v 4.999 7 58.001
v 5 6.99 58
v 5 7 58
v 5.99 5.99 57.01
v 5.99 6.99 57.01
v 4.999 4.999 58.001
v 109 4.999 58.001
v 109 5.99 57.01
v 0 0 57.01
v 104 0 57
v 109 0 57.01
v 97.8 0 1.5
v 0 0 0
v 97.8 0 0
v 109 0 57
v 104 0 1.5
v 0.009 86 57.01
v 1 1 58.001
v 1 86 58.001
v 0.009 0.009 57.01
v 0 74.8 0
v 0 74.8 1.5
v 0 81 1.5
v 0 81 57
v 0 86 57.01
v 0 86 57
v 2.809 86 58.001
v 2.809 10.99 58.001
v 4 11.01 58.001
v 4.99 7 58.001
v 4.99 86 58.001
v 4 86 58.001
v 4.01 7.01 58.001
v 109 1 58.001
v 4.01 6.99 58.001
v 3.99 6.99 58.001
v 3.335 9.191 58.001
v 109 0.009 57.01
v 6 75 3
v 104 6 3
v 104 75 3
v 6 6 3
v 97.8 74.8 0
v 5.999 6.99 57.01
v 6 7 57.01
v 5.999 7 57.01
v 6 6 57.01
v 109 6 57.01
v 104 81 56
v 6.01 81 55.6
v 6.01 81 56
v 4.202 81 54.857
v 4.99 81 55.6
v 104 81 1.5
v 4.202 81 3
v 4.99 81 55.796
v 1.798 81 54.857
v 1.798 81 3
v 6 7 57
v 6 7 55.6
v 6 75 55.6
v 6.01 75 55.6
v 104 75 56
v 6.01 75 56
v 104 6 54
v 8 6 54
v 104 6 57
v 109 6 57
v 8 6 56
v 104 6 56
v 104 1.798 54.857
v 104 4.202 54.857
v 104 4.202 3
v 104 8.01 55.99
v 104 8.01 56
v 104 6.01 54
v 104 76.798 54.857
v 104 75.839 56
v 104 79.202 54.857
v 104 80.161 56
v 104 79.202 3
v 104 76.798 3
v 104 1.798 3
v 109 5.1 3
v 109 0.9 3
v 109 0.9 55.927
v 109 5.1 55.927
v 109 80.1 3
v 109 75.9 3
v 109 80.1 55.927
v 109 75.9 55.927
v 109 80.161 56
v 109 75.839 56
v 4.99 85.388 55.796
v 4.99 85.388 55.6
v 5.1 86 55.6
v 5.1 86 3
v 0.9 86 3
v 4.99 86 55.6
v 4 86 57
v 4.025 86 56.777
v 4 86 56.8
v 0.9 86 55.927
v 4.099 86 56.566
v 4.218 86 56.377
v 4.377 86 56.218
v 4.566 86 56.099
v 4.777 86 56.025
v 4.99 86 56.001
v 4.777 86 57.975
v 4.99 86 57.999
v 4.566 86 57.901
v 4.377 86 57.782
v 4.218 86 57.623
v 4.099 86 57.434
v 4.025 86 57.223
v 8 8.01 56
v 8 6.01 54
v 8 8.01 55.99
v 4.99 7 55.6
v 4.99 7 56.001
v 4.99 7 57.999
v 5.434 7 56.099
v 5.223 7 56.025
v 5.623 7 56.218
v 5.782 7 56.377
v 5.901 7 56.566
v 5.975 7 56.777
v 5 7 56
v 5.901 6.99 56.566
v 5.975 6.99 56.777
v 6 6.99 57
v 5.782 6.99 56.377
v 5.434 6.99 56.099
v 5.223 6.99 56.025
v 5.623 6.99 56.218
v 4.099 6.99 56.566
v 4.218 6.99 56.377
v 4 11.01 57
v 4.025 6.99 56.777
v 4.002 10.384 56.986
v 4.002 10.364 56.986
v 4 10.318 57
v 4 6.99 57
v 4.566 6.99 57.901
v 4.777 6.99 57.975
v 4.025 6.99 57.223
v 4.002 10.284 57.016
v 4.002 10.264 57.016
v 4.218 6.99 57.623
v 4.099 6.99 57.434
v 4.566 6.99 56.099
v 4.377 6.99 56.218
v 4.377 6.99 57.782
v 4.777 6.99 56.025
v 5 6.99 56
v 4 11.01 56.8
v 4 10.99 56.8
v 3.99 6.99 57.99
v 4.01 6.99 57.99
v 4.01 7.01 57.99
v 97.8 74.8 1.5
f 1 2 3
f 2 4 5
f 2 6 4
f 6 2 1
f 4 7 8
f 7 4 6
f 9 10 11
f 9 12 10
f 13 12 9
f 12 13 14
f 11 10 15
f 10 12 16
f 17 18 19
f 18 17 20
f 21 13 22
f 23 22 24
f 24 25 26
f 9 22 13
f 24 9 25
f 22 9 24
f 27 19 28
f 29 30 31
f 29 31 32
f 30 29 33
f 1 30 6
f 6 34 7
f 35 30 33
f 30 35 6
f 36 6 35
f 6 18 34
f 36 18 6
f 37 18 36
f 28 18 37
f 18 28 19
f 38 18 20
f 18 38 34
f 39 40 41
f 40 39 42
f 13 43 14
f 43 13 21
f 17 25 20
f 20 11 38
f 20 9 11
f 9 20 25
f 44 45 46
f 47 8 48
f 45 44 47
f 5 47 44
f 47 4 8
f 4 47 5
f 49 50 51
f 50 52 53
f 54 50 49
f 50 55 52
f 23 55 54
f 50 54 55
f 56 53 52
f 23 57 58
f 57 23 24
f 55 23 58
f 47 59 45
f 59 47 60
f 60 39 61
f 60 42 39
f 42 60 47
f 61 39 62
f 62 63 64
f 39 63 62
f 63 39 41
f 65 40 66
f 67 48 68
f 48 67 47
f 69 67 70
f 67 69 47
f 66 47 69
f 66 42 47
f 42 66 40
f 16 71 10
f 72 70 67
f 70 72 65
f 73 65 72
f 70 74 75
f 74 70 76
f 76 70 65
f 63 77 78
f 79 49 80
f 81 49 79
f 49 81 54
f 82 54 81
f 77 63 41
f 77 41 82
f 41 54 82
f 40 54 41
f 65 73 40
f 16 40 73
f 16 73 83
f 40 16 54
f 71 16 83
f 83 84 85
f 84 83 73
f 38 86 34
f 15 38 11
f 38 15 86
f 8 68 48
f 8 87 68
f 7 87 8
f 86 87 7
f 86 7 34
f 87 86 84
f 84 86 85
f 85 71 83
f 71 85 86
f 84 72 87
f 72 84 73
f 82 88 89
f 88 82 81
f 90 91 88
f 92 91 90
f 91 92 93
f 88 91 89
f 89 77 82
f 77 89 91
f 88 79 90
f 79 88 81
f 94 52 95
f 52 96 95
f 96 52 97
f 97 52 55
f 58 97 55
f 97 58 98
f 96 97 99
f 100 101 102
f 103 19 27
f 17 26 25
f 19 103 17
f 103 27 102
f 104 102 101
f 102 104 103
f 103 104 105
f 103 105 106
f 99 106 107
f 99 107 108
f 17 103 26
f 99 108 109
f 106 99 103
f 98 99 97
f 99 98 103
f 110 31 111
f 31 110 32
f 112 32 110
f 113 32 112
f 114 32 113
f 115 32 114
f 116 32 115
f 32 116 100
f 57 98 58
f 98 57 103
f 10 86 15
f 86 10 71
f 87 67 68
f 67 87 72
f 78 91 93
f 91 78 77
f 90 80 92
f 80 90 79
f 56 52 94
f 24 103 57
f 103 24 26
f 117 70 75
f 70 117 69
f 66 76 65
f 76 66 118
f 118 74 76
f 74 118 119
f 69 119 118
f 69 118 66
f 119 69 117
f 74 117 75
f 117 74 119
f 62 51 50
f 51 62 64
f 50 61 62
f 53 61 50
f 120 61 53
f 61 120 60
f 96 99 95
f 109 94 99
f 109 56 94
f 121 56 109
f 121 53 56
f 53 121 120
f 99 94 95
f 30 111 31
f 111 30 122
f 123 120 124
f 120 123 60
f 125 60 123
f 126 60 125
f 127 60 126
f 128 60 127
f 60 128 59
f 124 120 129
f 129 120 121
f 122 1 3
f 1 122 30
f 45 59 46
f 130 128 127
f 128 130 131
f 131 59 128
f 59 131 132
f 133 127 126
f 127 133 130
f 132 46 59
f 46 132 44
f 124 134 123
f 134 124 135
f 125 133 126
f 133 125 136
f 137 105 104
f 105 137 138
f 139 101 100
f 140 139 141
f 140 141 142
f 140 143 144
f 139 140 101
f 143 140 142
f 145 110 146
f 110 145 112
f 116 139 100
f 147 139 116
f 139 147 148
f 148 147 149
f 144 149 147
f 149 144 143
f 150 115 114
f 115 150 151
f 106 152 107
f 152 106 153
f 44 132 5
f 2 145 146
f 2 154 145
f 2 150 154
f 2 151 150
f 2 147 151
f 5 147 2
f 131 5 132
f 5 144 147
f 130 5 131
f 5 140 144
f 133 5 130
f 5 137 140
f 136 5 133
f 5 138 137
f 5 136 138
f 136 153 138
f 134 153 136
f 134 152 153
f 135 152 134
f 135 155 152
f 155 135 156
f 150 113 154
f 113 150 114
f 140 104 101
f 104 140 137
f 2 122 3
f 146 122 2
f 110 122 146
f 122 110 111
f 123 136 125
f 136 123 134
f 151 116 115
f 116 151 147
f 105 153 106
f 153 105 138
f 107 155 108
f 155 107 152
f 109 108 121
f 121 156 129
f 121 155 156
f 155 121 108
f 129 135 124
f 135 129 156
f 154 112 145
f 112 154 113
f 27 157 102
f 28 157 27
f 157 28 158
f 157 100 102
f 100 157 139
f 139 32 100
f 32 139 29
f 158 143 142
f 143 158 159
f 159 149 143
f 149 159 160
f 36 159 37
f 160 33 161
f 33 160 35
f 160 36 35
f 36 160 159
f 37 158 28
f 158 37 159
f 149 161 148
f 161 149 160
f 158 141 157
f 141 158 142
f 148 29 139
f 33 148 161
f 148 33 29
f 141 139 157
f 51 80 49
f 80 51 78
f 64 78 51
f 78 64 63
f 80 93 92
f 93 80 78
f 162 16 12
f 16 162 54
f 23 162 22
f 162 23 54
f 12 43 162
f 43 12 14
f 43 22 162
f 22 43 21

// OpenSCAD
// ============================================================================
// cutlery_box.scad
// Graduated 3-chamber disposable-cutlery box (Option 3) — CUT-FROM-SOLID port
// of build_box.py, for a 120 x 120 x 120 mm printer (AOSEED).
//
// WHY THIS PORT EXISTS (the whole point):
//   The hand-mesh generator (build_box.py) could not keep the 1 mm rim chamfer
//   continuous across the female dovetail joints, because where a slot's flared
//   corner crosses the sloped chamfer it needs a true boolean intersection.
//   OpenSCAD HAS that boolean kernel, so here we do exactly the "cut-from-solid"
//   thing:
//      1. Build the ENTIRE box as ONE solid, WITH the chamfer already on it.
//      2. difference() out vertical dovetail prisms ( /_\ cross-section ),
//         running from just above the base plate up THROUGH the rim, to both
//         (a) form the sliding-dovetail joints, and
//         (b) split the box into 6 bed-sized pieces.
//   Because the cut is a real boolean through the already-chamfered solid, the
//   sloped chamfer<->slot edge is produced for free => the rim chamfer stays
//   CONTINUOUS across every joint, with none of the sliver hacks.
//
// ----------------------------------------------------------------------------
// HOW TO USE
//   In the app:  set `part` below (or use the Customizer dropdown), F5 to
//                preview, F6 to render, then File > Export > STL.
//   One piece (CLI):
//      openscad -o body_knife_A.stl -D 'part="knife_A"' cutlery_box.scad
//   ALL SIX (bash, run from this folder):
//      for p in knife_A knife_B fork_A fork_B spoon_A spoon_B; do \
//        openscad -o "body_$p.stl" -D "part=\"$p\"" cutlery_box.scad ; done
//   PNG preview of one piece:
//      openscad -o knife_B.png --imgsize=1400,1000 --autocenter --viewall \
//        -D 'part="knife_B"' cutlery_box.scad
//
//   Pieces are modelled in ASSEMBLED coordinates (floor-down, z=0 is the bed),
//   so importing all six STLs together shows the assembled box directly; your
//   slicer will auto-drop each one onto the plate for printing.
//
// BED SANITY: every piece is <= 120 mm in X, Y, Z.
//   Z = 58 mm. Widest piece = spoon at 117 mm (Y). A-halves reach 109 mm (X,
//   including the protruding dovetail key). All under 120.
//
// !! I could NOT run OpenSCAD to verify this file (no binary in my sandbox) !!
//   - The rim chamfer is a SMOOTH, true-45 bevel built from hull() frustums of
//     convex rectangles. Works in every OpenSCAD since ~2015 (incl. Homebrew
//     2021.01). No stepped staircase -- and, crucially, it makes box() a clean
//     well-formed solid so the per-part booleans resolve reliably (the old
//     14-slice staircase was fragile and CGAL was dropping the walls of the
//     interior parts, leaving only the key prisms => "floating boxes").
//   - roof() is still available behind USE_ROOF=true for those who have it
//     (2021.01+ snapshots); for THIS rectangular design it is identical, so it
//     is NOT required.
//   - After F6, check the console for "WARNING"/"not a valid 2-manifold".
//     If a tenon ever looks detached, bump EPS to 0.05.
// ============================================================================


/* [Part to render / export] */
part = "knife_A"; // [knife_A, knife_B, fork_A, fork_B, spoon_A, spoon_B, assembly]

/* [Chamfer method] */
// false = smooth hull() frustum bevel (default, any OpenSCAD); true = roof() (2021.01+)
USE_ROOF = false;

/* [Heights (mm)] */
BASE   = 3.0;     // floor / base-plate thickness
COMP_H = 55.0;    // interior wall height above the floor (cutlery stack depth)

/* [Walls (mm)] */
HOST_T   = 6.0;     // thickness of every wall (thick enough to host a dovetail)
HALF_LEN = 104.0;   // printed length of each half (A = near, B = far); <120 incl. key

/* [Chamber bays (mm)] */
N_COL     = 3;       // columns of cutlery per chamber
KNIFE_COL = 23.0;    // -> knife bay 69  (3 x 19 mm knives + play)
FORK_COL  = 33.0;    // -> fork  bay 99  (3 x 29 mm forks  + play)
SPOON_COL = 37.0;    // -> spoon bay 111 (3 x 34 mm spoons + play, trimmed <120)

/* [Dovetail joint (mm)] */
DT_DEPTH = 5.0;   // tail protrusion past the seam (male key depth)
DT_NECK  = 1.2;   // half-width at the seam face (narrow)
DT_FLARE = 2.1;   // half-width at the tip (wide -> locks)
DT_CLR   = 0.4;   // FLANK/seam slide clearance added to the female socket (do not change for fit)
DT_DEPTH_RELIEF = 0.3; // extra depth on the socket BACK only, so the tail tip never bottoms out

/* [Hidden-dovetail top cap / "hat" (mm)] */
// The dovetail otherwise shows its trapezoid outline on the TOP edge of the wall.
// To hide it, the MALE piece extends the wall's full-width top (chamfer included)
// across the key footprint -> a flush, continuous top. The FEMALE piece gets a
// matching top RECESS (cap footprint + CAP_CLR) so the cap drops straight in.
// Result: the top reads as one surface with a single straight seam line at the cap
// tip; the dovetail joinery lives entirely below the cap.
//
// SELF-SUPPORTING UNDERSIDE: the cap reaches the FULL wall width at the chamfer base
// (so the top edge reads as the wall extended, with NO recessed sliver on the outer
// face), and its underside is ONE planar ramp from the chamfer's OUTER CORNER
// (half-width HOST_T/2 at z = BODY_H-CHAMFER) down to the dovetail-neck half-width
// (CAP_FOOT) at CAP_SLANT_DEG from horizontal. No little horizontal step. The ramp
// reaching full width exactly at the chamfer base means "ramp top" == "chamfer base"
// (CAP_H is DERIVED). The FEMALE recess is the same ramp + CAP_CLR play.
// TRADEOFF: because the cap runs all the way to the outer corner, the female wall
// tapers to ~0 at z = BODY_H-CHAMFER -> a thin feather edge at the joint (gradual at
// CAP_SLANT_DEG, hidden inside the joint when assembled). Accepted per design intent.
CAP_SLANT_DEG = 50;     // cap underside ramp angle from horizontal (50 = self-supporting, long flare)
CAP_FOOT = DT_NECK;     // cap-underside half-width where it meets the dovetail neck
CAP_CLR = 0.3;          // slide clearance so the male cap seats into the female top recess

/* [Rim chamfer (mm)] */
CHAMFER = 1.0;    // 45-deg comfort break broken along the top wall edges

/* [Base half-lap / anti-warp (mm)] */
// Neighbouring base plates overlap as a HORIZONTAL half-lap (shiplap) at mid-base
// height, so corners stay coplanar (no lift/protrusion). Horizontal lap faces do
// NOT bind the vertical-drop assembly. Shingle direction: A->B and knife->fork->spoon.
LAP_LEN = 6;        // overlap past the A/B seam and the knife/fork seam
LAP_LEN_FS = 2;     // overlap past the fork/SPOON seam -- SMALLER: spoon is the
                    // tightest piece (117mm of the 120mm bed); a 6mm lap there
                    // would push spoon to 123mm. 2mm keeps spoon at 119mm.
LAP_Z   = BASE/2;   // 1.5 -- horizontal split height of the lap (bottom vs top half)
LAP_CLR = 0.2;      // in-plane clearance so the shelf isn't a press fit

/* [Lid — box features that receive a flat ORDERED clear sheet] */
// The lid itself is NOT printed: it's a flat ~2 mm PETG/Tritan sheet, bullnose-polished
// edges (r=LID_EDGE_R), ordered to size. We only model the box features that receive it.
LID_T            = 2.0;   // ordered sheet thickness
LID_EDGE_R       = 1.0;   // ordered sheet bullnose edge radius (for the sheet order spec)
LID_PLAY         = 0.4;   // total vertical play in the hinge groove (sheet + this)
HINGE_AT_MINUS_X = true;  // hinge on the -x (303mm) end wall; clip on +x. (flip = mirror; default delivered)
// perimeter support ledge (lid underside rests on it at z = BODY_H-LID_T)
LEDGE_W          = 2.0;   // ledge inward protrusion (its underside ramps back at 45 deg -> self-supporting)
GROOVE_END_INSET = 1.0;   // groove + mouth-ease stop this far short of each short wall (clean chamfer corner)
GROOVE_TAPER     = 4.0;   // y-length over which the eased mouth tapers out at each groove end
// hinge groove (cut into the inner face of the hinge end wall, CONTINUOUS along the long edge)
GROOVE_DEPTH     = 2.0;   // total depth into the wall (1.0 straight lead-in + 1.0 pocket radius)
GROOVE_POCKET_R  = 1.0;   // journal half-cylinder radius (the bullnose sheet edge rolls in it)
GROOVE_MOUTH_EASE= 1.2;   // 45 deg ease on the slot's inner-top lip so the sheet swings up & lifts out
// clip latch (one localized retainer, centered on the clip end wall)
CLIP_W           = 18.0;  // clip width
CLIP_LIP         = 0.4;   // retaining overhang (0.3 light .. 0.6 firm)
CLIP_RAMP_H      = 1.6;   // cam-ramp height above the rim (press-to-close)
// finger scallop (semicircular dish in the rim, centered on & aligned with the clip)
SCALLOP_W        = 16.0;  // scallop width
SCALLOP_DEPTH    = 6.0;   // how far it dishes down from the rim


/* [Hidden] */
EPS      = 0.01;          // tiny overlap so abutting solids fuse cleanly in CGAL
// Upper-chamber pieces (fork, spoon) were cut by a cell plane laid EXACTLY on the
// divider wall's far face (the lower chamber owns that wall). intersection() along a
// plane coincident with an existing box face makes CGAL leave a ZERO-THICKNESS copy
// of the wall face -> edge-manifold + "watertight" but degenerate (OpenSCAD shows it
// as a blue back-face; Tinkercad thickens it into a phantom block). SEAM_EPS nudges
// those cut planes a hair INTO the open bay so they no longer coincide with any box
// face -> no flap. 0.02 mm is physically nothing but is well clear of CGAL's tolerance.
SEAM_EPS = 0.02;
CUT_OVER = 1.0;           // how far dovetail cutters overshoot the rim (clean cut)

BODY_H    = BASE + COMP_H;     // 58  total height
END_WALL  = HOST_T;            // end walls are dovetail hosts too -> equally thick
TOTAL_LEN = 2 * HALF_LEN;      // 208 assembled length (end wall .. end wall)

// hidden-cap ramp geometry (derived).
//   CAP_HW    = cap MAX half-width = HOST_T/2 (the full wall edge) at the chamfer base.
//   CAP_RISE  = vertical height of the self-supporting CAP_SLANT_DEG underside ramp.
//   CAP_ZRAMP = where the cap reaches full width = the chamfer base (BODY_H-CHAMFER), so
//               the ramp runs straight to the chamfer OUTER CORNER (no horizontal step).
//   CAP_ZBOT  = cap bottom = ramp start; CAP_H derived from it (for reference/report).
//   CAP_ZRAMP_R = recess ramp top, shifted down by CAP_CLR so the recess ramp stays
//               parallel to the cap ramp with uniform play.
CAP_HW      = HOST_T/2;   // cap reaches the FULL wall edge at the chamfer base
CAP_RISE    = (CAP_HW - CAP_FOOT) * tan(CAP_SLANT_DEG);
CAP_ZRAMP   = BODY_H - CHAMFER;               // full width exactly at the chamfer base / outer corner
CAP_ZBOT    = CAP_ZRAMP - CAP_RISE;
CAP_H       = BODY_H - CAP_ZBOT;              // derived; reported
CAP_ZRAMP_R = CAP_ZRAMP;   // recess ramp ALSO tops at the chamfer corner (mirror the cap) -> no vertical lip
// sanity checks
assert(CAP_ZBOT > BASE + 1,
       "cap zone dips too low -- raise CAP_SLANT_DEG");
assert(CAP_HW >= DT_FLARE,
       "cap too narrow to cover the dovetail tail");

// NOTE: lid-derived constants are defined BELOW the Y-layout block, because some of
// them (INTERIOR_Y0/Y1, CLIP_CY) depend on OUTER_L / OUTER_R / EXT_W. See "lid derived".

// bay widths
KNIFE_BAY = N_COL * KNIFE_COL; // 69
FORK_BAY  = N_COL * FORK_COL;  // 99
SPOON_BAY = N_COL * SPOON_COL; // 111

// ---- Y layout (width direction): wall | bay | divider | bay | divider | bay | wall
KNIFE_Y0 = 0;
KNIFE_Y1 = HOST_T + KNIFE_BAY + HOST_T;        // 0..81   (outer wall + bay + divider)
FORK_Y0  = KNIFE_Y1;                           // 81
FORK_Y1  = FORK_Y0 + FORK_BAY + HOST_T;        // 81..186 (bay + divider)
SPOON_Y0 = FORK_Y1;                            // 186
SPOON_Y1 = SPOON_Y0 + SPOON_BAY + HOST_T;      // 186..303(bay + outer wall)
EXT_W    = SPOON_Y1;                           // 303 total width

// lengthwise wall Y-bands [y0,y1] (host the A/B dovetails) + their centers
OUTER_L  = [0, HOST_T];                                       // [0,6]    c=3
DIV_KF   = [HOST_T + KNIFE_BAY, HOST_T + KNIFE_BAY + HOST_T]; // [75,81]  c=78
DIV_FS   = [FORK_Y0 + FORK_BAY, FORK_Y0 + FORK_BAY + HOST_T]; // [180,186]c=183
OUTER_R  = [SPOON_Y1 - HOST_T, SPOON_Y1];                     // [297,303]c=300

// ---- lid derived ---- (placed AFTER OUTER_L/OUTER_R/EXT_W so nothing is forward-referenced)
LID_Z_UNDER = BODY_H - LID_T;             // 56  lid underside / ledge top / lowered-divider top
GROOVE_Z0   = BODY_H - (LID_T + LID_PLAY);// 55.6 groove bottom (top is the rim z=BODY_H, open to drop in)
POCKET_CZ   = BODY_H - LID_T/2;           // 57  journal pocket centre (sheet mid-thickness)
// hinge end-wall inner face x + inward direction; clip end-wall inner face x + inward dir
HINGE_INX   = HINGE_AT_MINUS_X ? END_WALL : TOTAL_LEN - END_WALL;       // 6  (default)
HINGE_IN    = HINGE_AT_MINUS_X ? 1 : -1;  // interior direction from the hinge wall (+x default)
CLIP_INX    = HINGE_AT_MINUS_X ? TOTAL_LEN - END_WALL : END_WALL;       // 202 (default)
CLIP_IN     = HINGE_AT_MINUS_X ? -1 : 1;  // interior direction from the clip wall (-x default)
POCKET_CX   = HINGE_INX - HINGE_IN*(GROOVE_DEPTH - GROOVE_POCKET_R);    // 5  pocket centre x (INTO the wall)
INTERIOR_Y0 = OUTER_L[1];                 // 6   inner face of the -y short wall
INTERIOR_Y1 = OUTER_R[0];                 // 297 inner face of the +y short wall
CLIP_CY     = EXT_W/2;                     // 151.5 clip/scallop centre (in the fork chamber)
assert(LID_Z_UNDER > CAP_ZBOT,
       "lid underside below the cap foot -- check LID_T vs cap geometry");

// the three OPEN bays are rectangular holes in the wall footprint:
//   footprint = outer rectangle MINUS these bays  (== the 6 walls; verified).
// The smooth chamfer is built from exactly this decomposition.
BAY_X0 = END_WALL;              // 6
BAY_X1 = TOTAL_LEN - END_WALL;  // 202
BAYS = [
    [BAY_X0, BAY_X1, HOST_T,   HOST_T + KNIFE_BAY],   // knife bay [6,202] x [6,75]
    [BAY_X0, BAY_X1, FORK_Y0,  FORK_Y0 + FORK_BAY],   // fork  bay [6,202] x [81,180]
    [BAY_X0, BAY_X1, SPOON_Y0, SPOON_Y0 + SPOON_BAY], // spoon bay [6,202] x [186,297]
];

YC_OUTL  = OUTER_L[0] + HOST_T/2;   // 3   outer-left wall center
YC_DIVKF = DIV_KF[0]  + HOST_T/2;   // 78  knife/fork divider center
YC_DIVFS = DIV_FS[0]  + HOST_T/2;   // 183 fork/spoon divider center
YC_OUTR  = OUTER_R[0] + HOST_T/2;   // 300 outer-right wall center

// seams
AB_SEAM = HALF_LEN;               // 104  A/B length seam (x)
SEAM_KF = FORK_Y0;                // 81   knife/fork width seam (y)
SEAM_FS = SPOON_Y0;              // 186  fork/spoon width seam (y)
ENDC_A  = END_WALL/2;             // 3    A end-wall center (x) -> chamber dovetails
ENDC_B  = TOTAL_LEN - END_WALL/2; // 205  B end-wall center (x)


// ============================================================================
// 2D wall footprint (cross-section of all walls, constant in z for the straight
// part). Union of: 2 full-width end walls + 4 lengthwise walls between them.
// ============================================================================
module wall_footprint_2d() {
    // footprint = outer rectangle minus the 3 open bays  (== the 6 walls)
    difference() {
        square([TOTAL_LEN, EXT_W]);
        for (b = BAYS) translate([b[0], b[2]]) square([b[1] - b[0], b[3] - b[2]]);
    }
}

// ============================================================================
// The full chamfered box solid = base plate + walls with a continuous 1 mm
// top-rim chamfer. Built ONCE; every piece is carved out of this.
// ============================================================================
module chamfer_cap() {
    // SMOOTH 45 rim chamfer over z[BODY_H-CHAMFER, BODY_H], in absolute coords.
    zm = BODY_H - CHAMFER;
    if (USE_ROOF) {
        // exact straight-skeleton roof, capped at CHAMFER height (needs roof()).
        intersection() {
            translate([0,0,zm]) roof() wall_footprint_2d();
            translate([0,0,zm]) linear_extrude(CHAMFER + EPS) wall_footprint_2d();
        }
    } else {
        // DEFAULT: true 45 bevel as hull() frustums of CONVEX rectangles -> smooth
        // AND a clean manifold.  Since footprint = outer - bays, the chamfer of the
        // footprint = (outer rectangle beveled inward) MINUS (each bay beveled so it
        // grows toward the top, which bevels every bay-facing rim).  All hull()s are
        // on convex rectangles, so nothing gets convex-filled.
        difference() {
            // outer perimeter frustum: full outer rect at zm -> inset by CHAMFER at top
            hull() {
                translate([0,0,zm])     linear_extrude(0.001) square([TOTAL_LEN, EXT_W]);
                translate([0,0,BODY_H]) linear_extrude(0.001) offset(delta=-CHAMFER) square([TOTAL_LEN, EXT_W]);
            }
            // each bay grows by CHAMFER toward the top -> bevels its surrounding rim.
            // (overshoots z a hair past both ends so the cut is clean.)
            for (b = BAYS)
                hull() {
                    translate([0,0,zm-EPS])     linear_extrude(0.001)
                        translate([b[0],b[2]]) offset(delta=-EPS)        square([b[1]-b[0], b[3]-b[2]]);
                    translate([0,0,BODY_H+EPS]) linear_extrude(0.001)
                        translate([b[0],b[2]]) offset(delta=CHAMFER+EPS) square([b[1]-b[0], b[3]-b[2]]);
                }
        }
    }
}

module box() {
    zm = BODY_H - CHAMFER;
    union() {
        cube([TOTAL_LEN, EXT_W, BASE]);                                        // base plate z[0,3]
        translate([0,0,BASE]) linear_extrude(zm - BASE + EPS) wall_footprint_2d(); // straight walls z[3,57]
        chamfer_cap();                                                         // smooth chamfer z[57,58]
    }
}

// ============================================================================
// Dovetail prisms ( /_\ ). Vertical, z[BASE, BODY_H+CUT_OVER] so they cut
// through the rim but leave the base plate continuous. The near face is pushed
// back EPS so a male key always fuses to its wall.
//   male key   : half_n=DT_NECK,         half_f=DT_FLARE
//   female slot: half_n=DT_NECK+DT_CLR,  half_f=DT_FLARE+DT_CLR
// ============================================================================
module dt_prism_X(seam_x, yc, half_n, half_f) {   // perpendicular to X, grows +X
    translate([0,0,BASE]) linear_extrude(BODY_H - BASE + CUT_OVER)
        polygon([[seam_x - EPS,        yc - half_n],
                 [seam_x + DT_DEPTH,   yc - half_f],
                 [seam_x + DT_DEPTH,   yc + half_f],
                 [seam_x - EPS,        yc + half_n]]);
}
module dt_prism_Y(seam_y, xc, half_n, half_f) {   // perpendicular to Y, grows +Y
    translate([0,0,BASE]) linear_extrude(BODY_H - BASE + CUT_OVER)
        polygon([[xc - half_n, seam_y - EPS],
                 [xc - half_f, seam_y + DT_DEPTH],
                 [xc + half_f, seam_y + DT_DEPTH],
                 [xc + half_n, seam_y - EPS]]);
}
module ab_key   (yc)        { dt_prism_X(AB_SEAM, yc, DT_NECK, DT_FLARE); }
module ch_key   (seam_y, xc){ dt_prism_Y(seam_y, xc, DT_NECK, DT_FLARE); }

// Female sockets = male + DT_CLR on the flanks/seam (unchanged), PLUS a straight
// back-face relief of DT_DEPTH_RELIEF so the tail tip never bottoms out. The
// relief is a rectangle tacked onto the trapezoid's tip at the SAME flare width,
// so the angled flank faces (and their 0.4 mm slide clearance) are untouched.
module ab_socket(yc) {
    dt_prism_X(AB_SEAM, yc, DT_NECK + DT_CLR, DT_FLARE + DT_CLR);
    translate([0,0,BASE]) linear_extrude(BODY_H - BASE + CUT_OVER)
        translate([AB_SEAM + DT_DEPTH, yc - (DT_FLARE + DT_CLR)])
            square([DT_DEPTH_RELIEF, 2*(DT_FLARE + DT_CLR)]);          // back relief, +X
}
module ch_socket(seam_y, xc) {
    dt_prism_Y(seam_y, xc, DT_NECK + DT_CLR, DT_FLARE + DT_CLR);
    translate([0,0,BASE]) linear_extrude(BODY_H - BASE + CUT_OVER)
        translate([xc - (DT_FLARE + DT_CLR), seam_y + DT_DEPTH])
            square([2*(DT_FLARE + DT_CLR), DT_DEPTH_RELIEF]);          // back relief, +Y
}

// ===== hidden-dovetail top cap ("hat"), SELF-SUPPORTING underside ===============
// MALE cap: a FULL-wall-width hat whose underside is ONE planar ramp from the chamfer's
// OUTER CORNER (half-width CAP_HW = HOST_T/2 at CAP_ZRAMP = BODY_H-CHAMFER) down to the
// dovetail-neck half-width (CAP_FOOT) at CAP_SLANT_DEG from horizontal -> the self-
// supporting shoulder, running straight to the corner (no horizontal step). Built as
// hull(narrow bottom slab buried in the tail neck, full-width top slab through the rim);
// box() trims it to the wall and adds the continuous rim chamfer for free, so the outer
// top edge reads as the wall extended (no recessed sliver). The protruding NOSE is left
// SQUARE (vertical) -- hidden in the female socket when assembled.
// TRADEOFF: the female wall tapers to ~0 at z=BODY_H-CHAMFER (a thin feather edge at the
// joint, gradual at CAP_SLANT_DEG) -- accepted per design intent.
module ab_cap(yc) {   // A/B seam, grows +X past the seam (length direction)
    hull() {
        translate([AB_SEAM - EPS, yc - CAP_FOOT, CAP_ZBOT])
            cube([DT_DEPTH + EPS, 2*CAP_FOOT, EPS]);
        translate([AB_SEAM - EPS, yc - CAP_HW,   CAP_ZRAMP])
            cube([DT_DEPTH + EPS, 2*CAP_HW, (BODY_H + CUT_OVER) - CAP_ZRAMP]);
    }
}
module ch_cap(seam_y, xc) {   // chamber seam, grows +Y past the seam (in the end wall)
    hull() {
        translate([xc - CAP_FOOT, seam_y - EPS, CAP_ZBOT])
            cube([2*CAP_FOOT, DT_DEPTH + EPS, EPS]);
        translate([xc - CAP_HW,   seam_y - EPS, CAP_ZRAMP])
            cube([2*CAP_HW, DT_DEPTH + EPS, (BODY_H + CUT_OVER) - CAP_ZRAMP]);
    }
}
// FEMALE recess: the SAME ramp grown by CAP_CLR (flanks, tip, floor, and ramp shifted down
// by CAP_CLR so it stays parallel) -> the cap seats with uniform slide clearance. It opens
// to the wall edge (and a hair past, into air) so the cap's full-width corner drops in;
// this is what leaves the thin female feather at the top (accepted). Open upward + toward seam.
module ab_cap_neg(yc) {
    hull() {
        translate([AB_SEAM - EPS, yc - (CAP_FOOT + CAP_CLR), CAP_ZBOT - CAP_CLR])
            cube([DT_DEPTH + CAP_CLR + EPS, 2*(CAP_FOOT + CAP_CLR), EPS]);
        translate([AB_SEAM - EPS, yc - (CAP_HW + EPS), CAP_ZRAMP_R])
            cube([DT_DEPTH + CAP_CLR + EPS, 2*(CAP_HW + EPS), (BODY_H + CUT_OVER + 1) - CAP_ZRAMP_R]);
    }
}
module ch_cap_neg(seam_y, xc) {
    hull() {
        translate([xc - (CAP_FOOT + CAP_CLR), seam_y - EPS, CAP_ZBOT - CAP_CLR])
            cube([2*(CAP_FOOT + CAP_CLR), DT_DEPTH + CAP_CLR + EPS, EPS]);
        translate([xc - (CAP_HW + EPS), seam_y - EPS, CAP_ZRAMP_R])
            cube([2*(CAP_HW + EPS), DT_DEPTH + CAP_CLR + EPS, (BODY_H + CUT_OVER + 1) - CAP_ZRAMP_R]);
    }
}

// rectangular cell (x[xa,xb], y[ya,yb], full height + margin) used to split pieces
module cell(xa, xb, ya, yb) {
    translate([xa, ya, -1]) cube([xb - xa, yb - ya, BODY_H + 11]);
}

// ===== base half-lap (shiplap) =================================================
// HORIZONTAL lap at mid-base height: the shelf-owner keeps its BOTTOM half
// (z 0..LAP_Z) extending LAP_LEN past the seam; the neighbour has its bottom half
// REMOVED there (keeps only the top half) and lands flat on the shelf. Horizontal
// faces => no binding during the vertical drop. Shelves live entirely in the base
// (z < BASE), well clear of the wall dovetails (z >= BASE).
// Shingle = FEMALE-first (matches the no-notch dovetail assembly order, which
// lowers the male piece onto the female): the B half owns the A/B shelf (grows
// -X into A) and the UPPER chamber (fork, spoon) owns the chamber shelf (grows
// -Y into the lower chamber).  Order: spoon, fork, knife; B before A.
module lap_shelf_X(y0, y1) {                 // B-side shelf, grows -X into A past AB_SEAM
    // +EPS past AB_SEAM so the shelf interpenetrates (not just abuts) its own B body -> fuses cleanly.
    translate([AB_SEAM - LAP_LEN, y0, 0]) cube([LAP_LEN + EPS, y1 - y0, LAP_Z]);
}
module lap_neg_X(y0, y1) {                   // A-side: remove bottom half to receive it
    translate([AB_SEAM - LAP_LEN - LAP_CLR, y0 - EPS, -EPS])
        cube([LAP_LEN + LAP_CLR + EPS, (y1 - y0) + 2*EPS, LAP_Z + EPS]);
}
module lap_shelf_Y(seam_y, x0, x1, ln=LAP_LEN) {   // upper-chamber shelf, grows -Y into lower
    // grows -Y by `ln` into the lower chamber AND +Y by 2*SEAM_EPS past the seam so it
    // always overlaps the (SEAM_EPS-nudged) body floor and stays fused -> no floating shelf.
    translate([x0, seam_y - ln, 0]) cube([x1 - x0, ln + 2*SEAM_EPS, LAP_Z]);
}
module lap_neg_Y(seam_y, x0, x1, ln=LAP_LEN) {     // lower-chamber: remove bottom half
    translate([x0 - EPS, seam_y - ln - LAP_CLR, -EPS])
        cube([(x1 - x0) + 2*EPS, ln + LAP_CLR + EPS, LAP_Z + EPS]);
}

// ============================================================================
// LID FEATURES (receive a flat ORDERED clear sheet; the sheet is not printed).
// All features live at the TOP (z >= ~52), ABOVE the dovetail engagement, the half-lap
// (z<1.5) and most of the hat, so the vertical-drop assembly and joints are untouched.
// EPS overlaps throughout; no coincident coplanar faces with the existing walls.
// Default orientation: HINGE on the -x end wall (A pieces), CLIP on the +x end wall
// (B pieces), clip+scallop centred on the fork (middle) chamber.
// ============================================================================

// --- perimeter support ledge: 45-deg self-supporting brackets; rest face at LID_Z_UNDER.
//     Runs along the CLIP end wall + the two short outer walls. (Hinge wall uses the groove.)
//     Built as hull(thin top edge, wall column) -> a triangular bracket whose underside is
//     a 45-deg ramp (prints floor-down with no support). ADDED to each piece (clipped by cell).
//     Each run is INSET by LEDGE_W from the perpendicular walls so the three brackets never
//     overlap at a corner and the wall's normal chamfer wraps every corner uninterrupted.
module lid_ledge() {
    cy0 = INTERIOR_Y0 + LEDGE_W;  cy1 = INTERIOR_Y1 - LEDGE_W;  cyl = cy1 - cy0;   // clip-run y span (inset)
    sx0 = END_WALL    + LEDGE_W;  sxl = (TOTAL_LEN - 2*END_WALL) - 2*LEDGE_W;       // short-run x span (inset)
    // clip end wall (x = CLIP_INX), bracket protrudes toward interior (CLIP_IN)
    hull() {
        translate([CLIP_INX + CLIP_IN*LEDGE_W, cy0, LID_Z_UNDER - EPS]) cube([EPS, cyl, EPS]);
        translate([CLIP_INX - EPS,             cy0, LID_Z_UNDER - LEDGE_W]) cube([2*EPS, cyl, LEDGE_W]);
    }
    // OUTER_L short wall (y = INTERIOR_Y0), bracket protrudes +y
    hull() {
        translate([sx0, INTERIOR_Y0 + LEDGE_W, LID_Z_UNDER - EPS]) cube([sxl, EPS, EPS]);
        translate([sx0, INTERIOR_Y0 - EPS,     LID_Z_UNDER - LEDGE_W]) cube([sxl, 2*EPS, LEDGE_W]);
    }
    // OUTER_R short wall (y = INTERIOR_Y1), bracket protrudes -y
    hull() {
        translate([sx0, INTERIOR_Y1 - LEDGE_W, LID_Z_UNDER - EPS]) cube([sxl, EPS, EPS]);
        translate([sx0, INTERIOR_Y1 - EPS,     LID_Z_UNDER - LEDGE_W]) cube([sxl, 2*EPS, LEDGE_W]);
    }
}

// --- hinge groove: a straight lead-in slot + a journal half-cylinder pocket + a 45-deg
//     mouth-ease on the wall-top behind the pocket (so the rigid sheet swings up wide and
//     can still lift out). Cut into the inner face of the HINGE end wall. CONTINUOUS along
//     the whole long edge (y ~7..296); it shaves only the top ~2.4mm inner tips of the two
//     chamber dovetails -- their engagement below GROOVE_Z0 and the 4mm outer wall remain.
//     The eased mouth TAPERS to nothing over GROOVE_TAPER at each end so it doesn't leave a
//     stub at the corners; the slot is open at the rim (z=BODY_H) so the sheet edge drops in.
EPX_MOUTH = POCKET_CX - HINGE_IN*GROOVE_POCKET_R;   // pocket-back top corner x (mouth-ease apex)
module mouth_slab(yc, dy) {                          // thin full-depth mouth-ease slice centred at yc
    translate([0, yc - dy/2, 0]) rotate([90,0,0]) translate([0,0,-dy]) linear_extrude(dy)
        polygon([[EPX_MOUTH, BODY_H + EPS],
                 [EPX_MOUTH - HINGE_IN*GROOVE_MOUTH_EASE, BODY_H + EPS],
                 [EPX_MOUTH, BODY_H - GROOVE_MOUTH_EASE]]);
}
module mouth_taper(yApex, yFull) {                   // wedge: vanishes at yApex, full at yFull
    hull() {
        mouth_slab(yFull, 2*EPS);
        translate([EPX_MOUTH - EPS, yApex - EPS, BODY_H - EPS]) cube([2*EPS, 2*EPS, 2*EPS]);
    }
}
module hinge_groove() {
    gy0 = INTERIOR_Y0 + GROOVE_END_INSET;            // 7    start (inset from -y short wall)
    gy1 = INTERIOR_Y1 - GROOVE_END_INSET;            // 296  end   (inset from +y short wall)
    sx0 = min(POCKET_CX, HINGE_INX);  sx1 = max(POCKET_CX, HINGE_INX);
    // straight lead-in slot (open to rim) + journal pocket, continuous
    translate([sx0 - EPS, gy0, GROOVE_Z0]) cube([sx1 - sx0 + 2*EPS, gy1 - gy0, BODY_H - GROOVE_Z0 + EPS]);
    translate([POCKET_CX, gy0 - EPS, POCKET_CZ]) rotate([-90,0,0]) cylinder(h = gy1 - gy0 + 2*EPS, r = GROOVE_POCKET_R, $fn = 28);
    // eased mouth: full-depth middle prism + a tapered wedge at each end
    mt = min(GROOVE_TAPER, (gy1 - gy0)/2 - EPS);
    translate([0, gy0 + mt, 0]) rotate([90,0,0]) translate([0,0,-((gy1 - mt) - (gy0 + mt))]) linear_extrude((gy1 - mt) - (gy0 + mt))
        polygon([[EPX_MOUTH, BODY_H + EPS],
                 [EPX_MOUTH - HINGE_IN*GROOVE_MOUTH_EASE, BODY_H + EPS],
                 [EPX_MOUTH, BODY_H - GROOVE_MOUTH_EASE]]);
    mouth_taper(gy0, gy0 + mt);                       // taper up from the -y corner
    mouth_taper(gy1, gy1 - mt);                       // taper down to the +y corner
}

// --- lower the inner chamber dividers to the lid underside (mid-support, no sag).
//     Removes the divider top over the full length; outer walls keep full height.
module divider_lower() {
    // x-span is the CHAMBER BAY only [BAY_X0, BAY_X1] (+EPS overlap into the end walls so the
    // cut is manifold). The end/outer walls keep their full BODY_H tops; only the two INNER
    // dividers (DIV_KF, DIV_FS) are lowered.
    translate([BAY_X0 - EPS, DIV_KF[0], LID_Z_UNDER]) cube([BAY_X1 - BAY_X0 + 2*EPS, HOST_T, BODY_H - LID_Z_UNDER + CUT_OVER]);
    translate([BAY_X0 - EPS, DIV_FS[0], LID_Z_UNDER]) cube([BAY_X1 - BAY_X0 + 2*EPS, HOST_T, BODY_H - LID_Z_UNDER + CUT_OVER]);
}

// --- retaining clip (ADDED): a cam-ramped lip on the clip end wall, centred on CLIP_CY.
//     Lip underside at the rim (z=BODY_H) overhangs the lid top by CLIP_LIP; ramp above
//     cams the lid under on close. Anchored into the wall (base at +/- HOST_T/2). Added
//     AFTER the scallop cut so the scallop never undercuts it.
module lid_clip() {
    translate([0, CLIP_CY - CLIP_W/2, 0]) rotate([90,0,0]) translate([0,0,-CLIP_W]) linear_extrude(CLIP_W)
        polygon([[CLIP_INX - CLIP_IN*HOST_T/2, BODY_H - EPS],            // base, into the wall (fuse)
                 [CLIP_INX + CLIP_IN*CLIP_LIP, BODY_H],                  // lip tip (overhang over lid)
                 [CLIP_INX + CLIP_IN*CLIP_LIP, BODY_H + 0.6],            // lip front
                 [CLIP_INX - CLIP_IN*HOST_T/2, BODY_H + CLIP_RAMP_H]]);  // ramp top at the wall
}

// --- finger scallop (CUT): a semicircular dish in the rim's INNER edge at the clip, so a
//     fingertip reaches under the lid edge to release it. Interior half only (does not
//     touch the wall body or the clip's anchor).
module lid_scallop() {
    intersection() {
        translate([CLIP_INX, CLIP_CY, BODY_H - SCALLOP_DEPTH]) cylinder(h = SCALLOP_DEPTH + EPS, r = SCALLOP_W/2, $fn = 40);
        translate([CLIP_INX + (CLIP_IN<0 ? -SCALLOP_W : 0), CLIP_CY - SCALLOP_W, BODY_H - SCALLOP_DEPTH - EPS])
            cube([SCALLOP_W, 2*SCALLOP_W, SCALLOP_DEPTH + 2*EPS]);
    }
}

// ============================================================================
// The six pieces.  piece = intersection(box, cell + own male keys) - own sockets
//   A halves are MALE on the A/B seam (keep the key); B halves are FEMALE (slot).
//   On a chamber seam the LEFT chamber is male (+Y), the right chamber is female.
// ============================================================================
// Base half-lap shingling (FEMALE-first, Option 1):
//   A/B seam  -> the B half owns the bottom shelf (grows -X), A has the negative.
//   chamber   -> the UPPER chamber (fork, spoon) owns the shelf (grows -Y); the
//                lower chamber (knife, fork) has the negative.
//   Assembly order: spoon, fork, knife; B before A (male lowered onto female).
// Center crossings (104,81)&(104,186): the CHAMBER shelf (fork_A / spoon_A) owns the
//   crossing square; the B-half A/B shelf (knife_B / fork_B) is CLIPPED short of the
//   chamber seam by LAP_LEN so two shelves never collide.
module knife_A() {                                       // placed LAST; receives everything
    difference() {
        union() {
            intersection() {
                box();
                union() {
                    cell(-1, AB_SEAM, KNIFE_Y0 - 1, KNIFE_Y1);
                    ab_key(YC_OUTL); ab_key(YC_DIVKF); ch_key(SEAM_KF, ENDC_A);
                    ab_cap(YC_OUTL); ab_cap(YC_DIVKF); ch_cap(SEAM_KF, ENDC_A);  // hide tops (male)
                }
            }
            intersection() { lid_ledge(); cell(-1, AB_SEAM, KNIFE_Y0 - 1, KNIFE_Y1); }  // lid support ledge
        }
        lap_neg_X(KNIFE_Y0, KNIFE_Y1);            // receive knife_B's A/B shelf
        lap_neg_Y(SEAM_KF, 0, AB_SEAM);           // receive fork_A's chamber shelf
        hinge_groove(); divider_lower(); lid_scallop();   // lid cuts (groove hits A pieces; divider/scallop where present)
    }
}

module knife_B() {
    difference() {
        union() {
            intersection() {
                box();
                union() {
                    cell(AB_SEAM, TOTAL_LEN + 1, KNIFE_Y0 - 1, KNIFE_Y1);
                    ch_key(SEAM_KF, ENDC_B);
                    ch_cap(SEAM_KF, ENDC_B);                // hide top (male, chamber)
                }
            }
            lap_shelf_X(KNIFE_Y0, KNIFE_Y1 - LAP_LEN);  // A/B shelf -> knife_A (CLIPPED at y=81 crossing)
            intersection() { lid_ledge(); cell(AB_SEAM, TOTAL_LEN + 1, KNIFE_Y0 - 1, KNIFE_Y1); }  // lid support ledge
        }
        ab_socket(YC_OUTL); ab_socket(YC_DIVKF);
        ab_cap_neg(YC_OUTL); ab_cap_neg(YC_DIVKF);      // top recesses to receive knife_A's caps (female)
        lap_neg_Y(SEAM_KF, AB_SEAM, TOTAL_LEN);         // receive fork_B's chamber shelf
        hinge_groove(); divider_lower(); lid_scallop();   // lid cuts
    }
}

module fork_A() {
    difference() {
        union() {
            intersection() {
                box();
                union() {
                    cell(-1, AB_SEAM, FORK_Y0 + SEAM_EPS, FORK_Y1);  // -Y cut nudged off the divider face
                    ab_key(YC_DIVFS); ch_key(SEAM_FS, ENDC_A);
                    ab_cap(YC_DIVFS); ch_cap(SEAM_FS, ENDC_A);       // hide tops (male)
                }
            }
            lap_shelf_Y(SEAM_KF, 0, AB_SEAM);           // chamber shelf -> knife_A (owns crossing)
            intersection() { lid_ledge(); cell(-1, AB_SEAM, FORK_Y0 + SEAM_EPS, FORK_Y1); }  // lid support ledge (none in fork-A)
        }
        lap_neg_X(FORK_Y0, FORK_Y1);                    // receive fork_B's A/B shelf
        ch_socket(SEAM_KF, ENDC_A);
        ch_cap_neg(SEAM_KF, ENDC_A);                    // top recess to receive knife_A's chamber cap (female)
        lap_neg_Y(SEAM_FS, 0, AB_SEAM, LAP_LEN_FS);     // receive spoon_A's (small) chamber shelf
        hinge_groove(); divider_lower(); lid_scallop();   // lid cuts (groove = fork-A hinge segment; divider = DIV_FS)
    }
}

module fork_B() {
    union() {
        difference() {
            union() {
                intersection() {
                    box();
                    union() {
                        cell(AB_SEAM, TOTAL_LEN + 1, FORK_Y0 + SEAM_EPS, FORK_Y1);  // -Y cut nudged off the divider face
                        ch_key(SEAM_FS, ENDC_B);
                        ch_cap(SEAM_FS, ENDC_B);                // hide top (male, chamber)
                    }
                }
                lap_shelf_X(FORK_Y0, FORK_Y1 - LAP_LEN_FS); // A/B shelf -> fork_A (CLIPPED at y=186 crossing)
                lap_shelf_Y(SEAM_KF, AB_SEAM, TOTAL_LEN);   // chamber shelf -> knife_B
                intersection() { lid_ledge(); cell(AB_SEAM, TOTAL_LEN + 1, FORK_Y0 + SEAM_EPS, FORK_Y1); }  // lid ledge (clip-end run)
            }
            ab_socket(YC_DIVFS);
            ab_cap_neg(YC_DIVFS);                           // top recess to receive fork_A's A/B cap (female)
            ch_socket(SEAM_KF, ENDC_B);
            ch_cap_neg(SEAM_KF, ENDC_B);                    // top recess to receive knife_B's chamber cap (female)
            lap_neg_Y(SEAM_FS, AB_SEAM, TOTAL_LEN, LAP_LEN_FS); // receive spoon_B's (small) chamber shelf
            hinge_groove(); divider_lower(); lid_scallop();     // lid cuts (scallop lands here)
        }
        intersection() { lid_clip(); cell(AB_SEAM, TOTAL_LEN + 1, FORK_Y0 + SEAM_EPS, FORK_Y1); }  // retaining clip, added AFTER the scallop cut
    }
}

module spoon_A() {
    difference() {
        union() {
            intersection() {
                box();
                union() {
                    cell(-1, AB_SEAM, SPOON_Y0 + SEAM_EPS, SPOON_Y1 + 1);  // -Y cut nudged off the divider face
                    ab_key(YC_OUTR);
                    ab_cap(YC_OUTR);                        // hide top (male)
                }
            }
            lap_shelf_Y(SEAM_FS, 0, AB_SEAM, LAP_LEN_FS); // chamber shelf -> fork_A (small; owns crossing)
            intersection() { lid_ledge(); cell(-1, AB_SEAM, SPOON_Y0 + SEAM_EPS, SPOON_Y1 + 1); }  // lid support ledge (OUTER_R run)
        }
        lap_neg_X(SPOON_Y0, SPOON_Y1);                  // receive spoon_B's A/B shelf
        ch_socket(SEAM_FS, ENDC_A);
        ch_cap_neg(SEAM_FS, ENDC_A);                    // top recess to receive fork_A's chamber cap (female)
        hinge_groove(); divider_lower(); lid_scallop();   // lid cuts (groove = spoon-A hinge segment)
    }
}

module spoon_B() {                                      // placed FIRST; owns shelves
    difference() {
        union() {
            intersection() {
                box();
                union() {
                    cell(AB_SEAM, TOTAL_LEN + 1, SPOON_Y0 + SEAM_EPS, SPOON_Y1 + 1);  // -Y cut nudged off the divider face
                }
            }
            lap_shelf_X(SPOON_Y0, SPOON_Y1);            // A/B shelf -> spoon_A
            lap_shelf_Y(SEAM_FS, AB_SEAM, TOTAL_LEN, LAP_LEN_FS); // chamber shelf -> fork_B (small)
            intersection() { lid_ledge(); cell(AB_SEAM, TOTAL_LEN + 1, SPOON_Y0 + SEAM_EPS, SPOON_Y1 + 1); }  // lid ledge (OUTER_R + clip-end runs)
        }
        ab_socket(YC_OUTR);
        ab_cap_neg(YC_OUTR);                            // top recess to receive spoon_A's A/B cap (female)
        ch_socket(SEAM_FS, ENDC_B);
        ch_cap_neg(SEAM_FS, ENDC_B);                    // top recess to receive fork_B's chamber cap (female)
        hinge_groove(); divider_lower(); lid_scallop();   // lid cuts
    }
}

// Fast preview: the full continuous-chamfer box (no cuts). The six part modules
// above are the real, separable pieces. To instead see the TRUE assembled
// pieces with their joints (slower — 6 booleans), replace box(); below with:
//   knife_A(); knife_B(); fork_A(); fork_B(); spoon_A(); spoon_B();
module assembly() {
    box();
}

// ============================================================================
// Render dispatch
// ============================================================================
if      (part == "knife_A")  knife_A();
else if (part == "knife_B")  knife_B();
else if (part == "fork_A")   fork_A();
else if (part == "fork_B")   fork_B();
else if (part == "spoon_A")  spoon_A();
else if (part == "spoon_B")  spoon_B();
else if (part == "assembly") assembly();
else echo(str("Unknown part: ", part));
